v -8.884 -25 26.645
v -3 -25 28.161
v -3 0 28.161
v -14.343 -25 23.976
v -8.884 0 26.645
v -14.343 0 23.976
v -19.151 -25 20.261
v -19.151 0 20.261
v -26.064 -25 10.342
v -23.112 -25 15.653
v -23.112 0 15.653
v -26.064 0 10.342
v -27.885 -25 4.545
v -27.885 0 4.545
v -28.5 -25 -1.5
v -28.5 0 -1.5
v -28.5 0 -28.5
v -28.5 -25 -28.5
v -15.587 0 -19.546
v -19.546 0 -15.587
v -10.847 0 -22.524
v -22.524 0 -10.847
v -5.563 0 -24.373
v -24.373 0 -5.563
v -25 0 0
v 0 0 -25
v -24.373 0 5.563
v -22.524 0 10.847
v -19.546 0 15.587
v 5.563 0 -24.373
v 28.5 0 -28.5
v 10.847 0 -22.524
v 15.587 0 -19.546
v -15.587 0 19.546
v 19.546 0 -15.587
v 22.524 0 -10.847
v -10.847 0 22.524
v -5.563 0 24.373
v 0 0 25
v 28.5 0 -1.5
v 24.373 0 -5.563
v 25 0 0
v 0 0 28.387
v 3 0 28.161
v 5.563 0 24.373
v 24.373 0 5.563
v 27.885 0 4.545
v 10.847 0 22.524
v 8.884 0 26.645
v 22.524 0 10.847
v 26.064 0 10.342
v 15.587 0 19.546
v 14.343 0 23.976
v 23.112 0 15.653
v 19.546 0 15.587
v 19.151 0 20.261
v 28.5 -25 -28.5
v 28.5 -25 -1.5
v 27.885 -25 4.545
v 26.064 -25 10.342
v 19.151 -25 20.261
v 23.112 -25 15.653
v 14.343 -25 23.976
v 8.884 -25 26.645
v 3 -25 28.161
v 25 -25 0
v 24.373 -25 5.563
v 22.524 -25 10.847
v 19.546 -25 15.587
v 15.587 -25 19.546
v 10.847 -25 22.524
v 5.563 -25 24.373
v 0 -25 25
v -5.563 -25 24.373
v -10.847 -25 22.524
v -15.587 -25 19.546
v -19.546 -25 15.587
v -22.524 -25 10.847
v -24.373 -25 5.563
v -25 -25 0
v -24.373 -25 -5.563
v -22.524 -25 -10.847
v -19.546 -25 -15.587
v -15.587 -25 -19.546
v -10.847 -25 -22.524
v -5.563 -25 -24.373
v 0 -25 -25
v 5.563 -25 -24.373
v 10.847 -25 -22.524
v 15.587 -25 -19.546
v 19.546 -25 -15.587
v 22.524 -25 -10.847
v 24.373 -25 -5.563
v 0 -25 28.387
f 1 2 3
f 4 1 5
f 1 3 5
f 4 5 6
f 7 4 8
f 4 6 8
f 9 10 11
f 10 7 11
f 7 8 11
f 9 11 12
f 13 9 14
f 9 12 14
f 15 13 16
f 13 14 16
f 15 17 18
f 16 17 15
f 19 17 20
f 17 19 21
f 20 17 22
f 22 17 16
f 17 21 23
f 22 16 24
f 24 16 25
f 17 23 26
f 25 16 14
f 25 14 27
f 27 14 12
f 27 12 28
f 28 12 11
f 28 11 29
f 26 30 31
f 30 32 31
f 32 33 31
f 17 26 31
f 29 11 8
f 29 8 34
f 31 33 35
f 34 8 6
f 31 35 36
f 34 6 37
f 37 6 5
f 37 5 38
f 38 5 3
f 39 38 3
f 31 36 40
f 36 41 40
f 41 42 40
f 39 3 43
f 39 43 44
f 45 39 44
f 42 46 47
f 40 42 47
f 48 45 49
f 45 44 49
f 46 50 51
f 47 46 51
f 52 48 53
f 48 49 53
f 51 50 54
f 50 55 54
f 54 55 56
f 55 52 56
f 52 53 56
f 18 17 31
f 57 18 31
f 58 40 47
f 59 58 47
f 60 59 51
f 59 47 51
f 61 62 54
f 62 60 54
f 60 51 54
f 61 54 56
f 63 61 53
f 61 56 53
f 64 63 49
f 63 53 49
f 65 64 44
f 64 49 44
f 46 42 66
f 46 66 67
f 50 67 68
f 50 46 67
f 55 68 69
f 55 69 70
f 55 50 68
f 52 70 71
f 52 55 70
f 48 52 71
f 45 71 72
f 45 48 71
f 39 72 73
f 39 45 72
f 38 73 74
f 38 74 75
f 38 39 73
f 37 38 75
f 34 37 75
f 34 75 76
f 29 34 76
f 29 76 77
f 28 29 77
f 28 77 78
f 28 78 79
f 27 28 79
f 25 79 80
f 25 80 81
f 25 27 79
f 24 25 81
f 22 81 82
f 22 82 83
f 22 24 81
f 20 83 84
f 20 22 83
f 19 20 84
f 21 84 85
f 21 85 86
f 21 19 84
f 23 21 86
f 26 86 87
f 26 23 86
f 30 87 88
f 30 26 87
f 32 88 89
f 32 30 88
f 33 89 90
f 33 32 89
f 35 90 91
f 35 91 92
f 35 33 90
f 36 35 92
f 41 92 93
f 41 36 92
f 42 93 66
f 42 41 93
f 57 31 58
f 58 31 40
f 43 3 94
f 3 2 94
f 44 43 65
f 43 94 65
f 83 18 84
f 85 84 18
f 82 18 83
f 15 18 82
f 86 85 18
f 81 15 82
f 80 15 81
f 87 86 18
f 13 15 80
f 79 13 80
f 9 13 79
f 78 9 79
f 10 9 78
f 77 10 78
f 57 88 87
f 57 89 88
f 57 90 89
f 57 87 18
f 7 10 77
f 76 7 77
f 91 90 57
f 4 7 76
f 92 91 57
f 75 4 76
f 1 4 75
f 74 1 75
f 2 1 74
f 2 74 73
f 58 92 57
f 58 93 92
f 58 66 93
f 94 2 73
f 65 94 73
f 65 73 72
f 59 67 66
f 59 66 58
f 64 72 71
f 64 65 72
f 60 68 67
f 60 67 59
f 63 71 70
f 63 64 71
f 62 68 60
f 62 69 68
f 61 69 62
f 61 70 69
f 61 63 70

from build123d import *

# Parameters (mm, degrees)
F0_W        = 57
F0_H        = 57
F0_R        = 25
F1_DEPTH    = 25
F2_T1_DEPTH = 175
F3_R        = 20


# Not quite as in the source:
# - a fillet or chamfer that OpenCascade refuses, or shapes differently, is made with other operations: its cross-section is extruded or revolved along the edge and cut away or added


with BuildPart() as f1:
    # F0 (on Front) → F1 (new body)
    with BuildSketch(Plane.XZ):
        Rectangle(F0_W, F0_H)
        Circle(F0_R, mode=Mode.SUBTRACT)
    extrude(amount=F1_DEPTH)

    # F2: fillet of radius 30 on 2 edges, made by hand

    # F2_s2 → F2_t1 (cut)
    with BuildSketch(Plane.XZ.offset(-75)):
        with BuildLine():
            ThreePointArc((28.5, -1.5), (19.7132034356, 19.7132034356), (-1.5, 28.5))
            Line((-1.5, 28.5), (28.5, 28.5))
            Line((28.5, 28.5), (28.5, -1.5))
        make_face()
        with BuildLine():
            ThreePointArc((1.5, 28.5), (-19.7132034356, 19.7132034356), (-28.5, -1.5))
            Line((-28.5, -1.5), (-28.5, 28.5))
            Line((-28.5, 28.5), (1.5, 28.5))
        make_face()
    extrude(amount=F2_T1_DEPTH, mode=Mode.SUBTRACT)

    # F3
    f3_edges = [f1.edges().sort_by_distance(p)[0] for p in [
        (0, -12.5, 28.462477),
    ]]
    fillet(f3_edges, radius=F3_R)


solid = f1.part
